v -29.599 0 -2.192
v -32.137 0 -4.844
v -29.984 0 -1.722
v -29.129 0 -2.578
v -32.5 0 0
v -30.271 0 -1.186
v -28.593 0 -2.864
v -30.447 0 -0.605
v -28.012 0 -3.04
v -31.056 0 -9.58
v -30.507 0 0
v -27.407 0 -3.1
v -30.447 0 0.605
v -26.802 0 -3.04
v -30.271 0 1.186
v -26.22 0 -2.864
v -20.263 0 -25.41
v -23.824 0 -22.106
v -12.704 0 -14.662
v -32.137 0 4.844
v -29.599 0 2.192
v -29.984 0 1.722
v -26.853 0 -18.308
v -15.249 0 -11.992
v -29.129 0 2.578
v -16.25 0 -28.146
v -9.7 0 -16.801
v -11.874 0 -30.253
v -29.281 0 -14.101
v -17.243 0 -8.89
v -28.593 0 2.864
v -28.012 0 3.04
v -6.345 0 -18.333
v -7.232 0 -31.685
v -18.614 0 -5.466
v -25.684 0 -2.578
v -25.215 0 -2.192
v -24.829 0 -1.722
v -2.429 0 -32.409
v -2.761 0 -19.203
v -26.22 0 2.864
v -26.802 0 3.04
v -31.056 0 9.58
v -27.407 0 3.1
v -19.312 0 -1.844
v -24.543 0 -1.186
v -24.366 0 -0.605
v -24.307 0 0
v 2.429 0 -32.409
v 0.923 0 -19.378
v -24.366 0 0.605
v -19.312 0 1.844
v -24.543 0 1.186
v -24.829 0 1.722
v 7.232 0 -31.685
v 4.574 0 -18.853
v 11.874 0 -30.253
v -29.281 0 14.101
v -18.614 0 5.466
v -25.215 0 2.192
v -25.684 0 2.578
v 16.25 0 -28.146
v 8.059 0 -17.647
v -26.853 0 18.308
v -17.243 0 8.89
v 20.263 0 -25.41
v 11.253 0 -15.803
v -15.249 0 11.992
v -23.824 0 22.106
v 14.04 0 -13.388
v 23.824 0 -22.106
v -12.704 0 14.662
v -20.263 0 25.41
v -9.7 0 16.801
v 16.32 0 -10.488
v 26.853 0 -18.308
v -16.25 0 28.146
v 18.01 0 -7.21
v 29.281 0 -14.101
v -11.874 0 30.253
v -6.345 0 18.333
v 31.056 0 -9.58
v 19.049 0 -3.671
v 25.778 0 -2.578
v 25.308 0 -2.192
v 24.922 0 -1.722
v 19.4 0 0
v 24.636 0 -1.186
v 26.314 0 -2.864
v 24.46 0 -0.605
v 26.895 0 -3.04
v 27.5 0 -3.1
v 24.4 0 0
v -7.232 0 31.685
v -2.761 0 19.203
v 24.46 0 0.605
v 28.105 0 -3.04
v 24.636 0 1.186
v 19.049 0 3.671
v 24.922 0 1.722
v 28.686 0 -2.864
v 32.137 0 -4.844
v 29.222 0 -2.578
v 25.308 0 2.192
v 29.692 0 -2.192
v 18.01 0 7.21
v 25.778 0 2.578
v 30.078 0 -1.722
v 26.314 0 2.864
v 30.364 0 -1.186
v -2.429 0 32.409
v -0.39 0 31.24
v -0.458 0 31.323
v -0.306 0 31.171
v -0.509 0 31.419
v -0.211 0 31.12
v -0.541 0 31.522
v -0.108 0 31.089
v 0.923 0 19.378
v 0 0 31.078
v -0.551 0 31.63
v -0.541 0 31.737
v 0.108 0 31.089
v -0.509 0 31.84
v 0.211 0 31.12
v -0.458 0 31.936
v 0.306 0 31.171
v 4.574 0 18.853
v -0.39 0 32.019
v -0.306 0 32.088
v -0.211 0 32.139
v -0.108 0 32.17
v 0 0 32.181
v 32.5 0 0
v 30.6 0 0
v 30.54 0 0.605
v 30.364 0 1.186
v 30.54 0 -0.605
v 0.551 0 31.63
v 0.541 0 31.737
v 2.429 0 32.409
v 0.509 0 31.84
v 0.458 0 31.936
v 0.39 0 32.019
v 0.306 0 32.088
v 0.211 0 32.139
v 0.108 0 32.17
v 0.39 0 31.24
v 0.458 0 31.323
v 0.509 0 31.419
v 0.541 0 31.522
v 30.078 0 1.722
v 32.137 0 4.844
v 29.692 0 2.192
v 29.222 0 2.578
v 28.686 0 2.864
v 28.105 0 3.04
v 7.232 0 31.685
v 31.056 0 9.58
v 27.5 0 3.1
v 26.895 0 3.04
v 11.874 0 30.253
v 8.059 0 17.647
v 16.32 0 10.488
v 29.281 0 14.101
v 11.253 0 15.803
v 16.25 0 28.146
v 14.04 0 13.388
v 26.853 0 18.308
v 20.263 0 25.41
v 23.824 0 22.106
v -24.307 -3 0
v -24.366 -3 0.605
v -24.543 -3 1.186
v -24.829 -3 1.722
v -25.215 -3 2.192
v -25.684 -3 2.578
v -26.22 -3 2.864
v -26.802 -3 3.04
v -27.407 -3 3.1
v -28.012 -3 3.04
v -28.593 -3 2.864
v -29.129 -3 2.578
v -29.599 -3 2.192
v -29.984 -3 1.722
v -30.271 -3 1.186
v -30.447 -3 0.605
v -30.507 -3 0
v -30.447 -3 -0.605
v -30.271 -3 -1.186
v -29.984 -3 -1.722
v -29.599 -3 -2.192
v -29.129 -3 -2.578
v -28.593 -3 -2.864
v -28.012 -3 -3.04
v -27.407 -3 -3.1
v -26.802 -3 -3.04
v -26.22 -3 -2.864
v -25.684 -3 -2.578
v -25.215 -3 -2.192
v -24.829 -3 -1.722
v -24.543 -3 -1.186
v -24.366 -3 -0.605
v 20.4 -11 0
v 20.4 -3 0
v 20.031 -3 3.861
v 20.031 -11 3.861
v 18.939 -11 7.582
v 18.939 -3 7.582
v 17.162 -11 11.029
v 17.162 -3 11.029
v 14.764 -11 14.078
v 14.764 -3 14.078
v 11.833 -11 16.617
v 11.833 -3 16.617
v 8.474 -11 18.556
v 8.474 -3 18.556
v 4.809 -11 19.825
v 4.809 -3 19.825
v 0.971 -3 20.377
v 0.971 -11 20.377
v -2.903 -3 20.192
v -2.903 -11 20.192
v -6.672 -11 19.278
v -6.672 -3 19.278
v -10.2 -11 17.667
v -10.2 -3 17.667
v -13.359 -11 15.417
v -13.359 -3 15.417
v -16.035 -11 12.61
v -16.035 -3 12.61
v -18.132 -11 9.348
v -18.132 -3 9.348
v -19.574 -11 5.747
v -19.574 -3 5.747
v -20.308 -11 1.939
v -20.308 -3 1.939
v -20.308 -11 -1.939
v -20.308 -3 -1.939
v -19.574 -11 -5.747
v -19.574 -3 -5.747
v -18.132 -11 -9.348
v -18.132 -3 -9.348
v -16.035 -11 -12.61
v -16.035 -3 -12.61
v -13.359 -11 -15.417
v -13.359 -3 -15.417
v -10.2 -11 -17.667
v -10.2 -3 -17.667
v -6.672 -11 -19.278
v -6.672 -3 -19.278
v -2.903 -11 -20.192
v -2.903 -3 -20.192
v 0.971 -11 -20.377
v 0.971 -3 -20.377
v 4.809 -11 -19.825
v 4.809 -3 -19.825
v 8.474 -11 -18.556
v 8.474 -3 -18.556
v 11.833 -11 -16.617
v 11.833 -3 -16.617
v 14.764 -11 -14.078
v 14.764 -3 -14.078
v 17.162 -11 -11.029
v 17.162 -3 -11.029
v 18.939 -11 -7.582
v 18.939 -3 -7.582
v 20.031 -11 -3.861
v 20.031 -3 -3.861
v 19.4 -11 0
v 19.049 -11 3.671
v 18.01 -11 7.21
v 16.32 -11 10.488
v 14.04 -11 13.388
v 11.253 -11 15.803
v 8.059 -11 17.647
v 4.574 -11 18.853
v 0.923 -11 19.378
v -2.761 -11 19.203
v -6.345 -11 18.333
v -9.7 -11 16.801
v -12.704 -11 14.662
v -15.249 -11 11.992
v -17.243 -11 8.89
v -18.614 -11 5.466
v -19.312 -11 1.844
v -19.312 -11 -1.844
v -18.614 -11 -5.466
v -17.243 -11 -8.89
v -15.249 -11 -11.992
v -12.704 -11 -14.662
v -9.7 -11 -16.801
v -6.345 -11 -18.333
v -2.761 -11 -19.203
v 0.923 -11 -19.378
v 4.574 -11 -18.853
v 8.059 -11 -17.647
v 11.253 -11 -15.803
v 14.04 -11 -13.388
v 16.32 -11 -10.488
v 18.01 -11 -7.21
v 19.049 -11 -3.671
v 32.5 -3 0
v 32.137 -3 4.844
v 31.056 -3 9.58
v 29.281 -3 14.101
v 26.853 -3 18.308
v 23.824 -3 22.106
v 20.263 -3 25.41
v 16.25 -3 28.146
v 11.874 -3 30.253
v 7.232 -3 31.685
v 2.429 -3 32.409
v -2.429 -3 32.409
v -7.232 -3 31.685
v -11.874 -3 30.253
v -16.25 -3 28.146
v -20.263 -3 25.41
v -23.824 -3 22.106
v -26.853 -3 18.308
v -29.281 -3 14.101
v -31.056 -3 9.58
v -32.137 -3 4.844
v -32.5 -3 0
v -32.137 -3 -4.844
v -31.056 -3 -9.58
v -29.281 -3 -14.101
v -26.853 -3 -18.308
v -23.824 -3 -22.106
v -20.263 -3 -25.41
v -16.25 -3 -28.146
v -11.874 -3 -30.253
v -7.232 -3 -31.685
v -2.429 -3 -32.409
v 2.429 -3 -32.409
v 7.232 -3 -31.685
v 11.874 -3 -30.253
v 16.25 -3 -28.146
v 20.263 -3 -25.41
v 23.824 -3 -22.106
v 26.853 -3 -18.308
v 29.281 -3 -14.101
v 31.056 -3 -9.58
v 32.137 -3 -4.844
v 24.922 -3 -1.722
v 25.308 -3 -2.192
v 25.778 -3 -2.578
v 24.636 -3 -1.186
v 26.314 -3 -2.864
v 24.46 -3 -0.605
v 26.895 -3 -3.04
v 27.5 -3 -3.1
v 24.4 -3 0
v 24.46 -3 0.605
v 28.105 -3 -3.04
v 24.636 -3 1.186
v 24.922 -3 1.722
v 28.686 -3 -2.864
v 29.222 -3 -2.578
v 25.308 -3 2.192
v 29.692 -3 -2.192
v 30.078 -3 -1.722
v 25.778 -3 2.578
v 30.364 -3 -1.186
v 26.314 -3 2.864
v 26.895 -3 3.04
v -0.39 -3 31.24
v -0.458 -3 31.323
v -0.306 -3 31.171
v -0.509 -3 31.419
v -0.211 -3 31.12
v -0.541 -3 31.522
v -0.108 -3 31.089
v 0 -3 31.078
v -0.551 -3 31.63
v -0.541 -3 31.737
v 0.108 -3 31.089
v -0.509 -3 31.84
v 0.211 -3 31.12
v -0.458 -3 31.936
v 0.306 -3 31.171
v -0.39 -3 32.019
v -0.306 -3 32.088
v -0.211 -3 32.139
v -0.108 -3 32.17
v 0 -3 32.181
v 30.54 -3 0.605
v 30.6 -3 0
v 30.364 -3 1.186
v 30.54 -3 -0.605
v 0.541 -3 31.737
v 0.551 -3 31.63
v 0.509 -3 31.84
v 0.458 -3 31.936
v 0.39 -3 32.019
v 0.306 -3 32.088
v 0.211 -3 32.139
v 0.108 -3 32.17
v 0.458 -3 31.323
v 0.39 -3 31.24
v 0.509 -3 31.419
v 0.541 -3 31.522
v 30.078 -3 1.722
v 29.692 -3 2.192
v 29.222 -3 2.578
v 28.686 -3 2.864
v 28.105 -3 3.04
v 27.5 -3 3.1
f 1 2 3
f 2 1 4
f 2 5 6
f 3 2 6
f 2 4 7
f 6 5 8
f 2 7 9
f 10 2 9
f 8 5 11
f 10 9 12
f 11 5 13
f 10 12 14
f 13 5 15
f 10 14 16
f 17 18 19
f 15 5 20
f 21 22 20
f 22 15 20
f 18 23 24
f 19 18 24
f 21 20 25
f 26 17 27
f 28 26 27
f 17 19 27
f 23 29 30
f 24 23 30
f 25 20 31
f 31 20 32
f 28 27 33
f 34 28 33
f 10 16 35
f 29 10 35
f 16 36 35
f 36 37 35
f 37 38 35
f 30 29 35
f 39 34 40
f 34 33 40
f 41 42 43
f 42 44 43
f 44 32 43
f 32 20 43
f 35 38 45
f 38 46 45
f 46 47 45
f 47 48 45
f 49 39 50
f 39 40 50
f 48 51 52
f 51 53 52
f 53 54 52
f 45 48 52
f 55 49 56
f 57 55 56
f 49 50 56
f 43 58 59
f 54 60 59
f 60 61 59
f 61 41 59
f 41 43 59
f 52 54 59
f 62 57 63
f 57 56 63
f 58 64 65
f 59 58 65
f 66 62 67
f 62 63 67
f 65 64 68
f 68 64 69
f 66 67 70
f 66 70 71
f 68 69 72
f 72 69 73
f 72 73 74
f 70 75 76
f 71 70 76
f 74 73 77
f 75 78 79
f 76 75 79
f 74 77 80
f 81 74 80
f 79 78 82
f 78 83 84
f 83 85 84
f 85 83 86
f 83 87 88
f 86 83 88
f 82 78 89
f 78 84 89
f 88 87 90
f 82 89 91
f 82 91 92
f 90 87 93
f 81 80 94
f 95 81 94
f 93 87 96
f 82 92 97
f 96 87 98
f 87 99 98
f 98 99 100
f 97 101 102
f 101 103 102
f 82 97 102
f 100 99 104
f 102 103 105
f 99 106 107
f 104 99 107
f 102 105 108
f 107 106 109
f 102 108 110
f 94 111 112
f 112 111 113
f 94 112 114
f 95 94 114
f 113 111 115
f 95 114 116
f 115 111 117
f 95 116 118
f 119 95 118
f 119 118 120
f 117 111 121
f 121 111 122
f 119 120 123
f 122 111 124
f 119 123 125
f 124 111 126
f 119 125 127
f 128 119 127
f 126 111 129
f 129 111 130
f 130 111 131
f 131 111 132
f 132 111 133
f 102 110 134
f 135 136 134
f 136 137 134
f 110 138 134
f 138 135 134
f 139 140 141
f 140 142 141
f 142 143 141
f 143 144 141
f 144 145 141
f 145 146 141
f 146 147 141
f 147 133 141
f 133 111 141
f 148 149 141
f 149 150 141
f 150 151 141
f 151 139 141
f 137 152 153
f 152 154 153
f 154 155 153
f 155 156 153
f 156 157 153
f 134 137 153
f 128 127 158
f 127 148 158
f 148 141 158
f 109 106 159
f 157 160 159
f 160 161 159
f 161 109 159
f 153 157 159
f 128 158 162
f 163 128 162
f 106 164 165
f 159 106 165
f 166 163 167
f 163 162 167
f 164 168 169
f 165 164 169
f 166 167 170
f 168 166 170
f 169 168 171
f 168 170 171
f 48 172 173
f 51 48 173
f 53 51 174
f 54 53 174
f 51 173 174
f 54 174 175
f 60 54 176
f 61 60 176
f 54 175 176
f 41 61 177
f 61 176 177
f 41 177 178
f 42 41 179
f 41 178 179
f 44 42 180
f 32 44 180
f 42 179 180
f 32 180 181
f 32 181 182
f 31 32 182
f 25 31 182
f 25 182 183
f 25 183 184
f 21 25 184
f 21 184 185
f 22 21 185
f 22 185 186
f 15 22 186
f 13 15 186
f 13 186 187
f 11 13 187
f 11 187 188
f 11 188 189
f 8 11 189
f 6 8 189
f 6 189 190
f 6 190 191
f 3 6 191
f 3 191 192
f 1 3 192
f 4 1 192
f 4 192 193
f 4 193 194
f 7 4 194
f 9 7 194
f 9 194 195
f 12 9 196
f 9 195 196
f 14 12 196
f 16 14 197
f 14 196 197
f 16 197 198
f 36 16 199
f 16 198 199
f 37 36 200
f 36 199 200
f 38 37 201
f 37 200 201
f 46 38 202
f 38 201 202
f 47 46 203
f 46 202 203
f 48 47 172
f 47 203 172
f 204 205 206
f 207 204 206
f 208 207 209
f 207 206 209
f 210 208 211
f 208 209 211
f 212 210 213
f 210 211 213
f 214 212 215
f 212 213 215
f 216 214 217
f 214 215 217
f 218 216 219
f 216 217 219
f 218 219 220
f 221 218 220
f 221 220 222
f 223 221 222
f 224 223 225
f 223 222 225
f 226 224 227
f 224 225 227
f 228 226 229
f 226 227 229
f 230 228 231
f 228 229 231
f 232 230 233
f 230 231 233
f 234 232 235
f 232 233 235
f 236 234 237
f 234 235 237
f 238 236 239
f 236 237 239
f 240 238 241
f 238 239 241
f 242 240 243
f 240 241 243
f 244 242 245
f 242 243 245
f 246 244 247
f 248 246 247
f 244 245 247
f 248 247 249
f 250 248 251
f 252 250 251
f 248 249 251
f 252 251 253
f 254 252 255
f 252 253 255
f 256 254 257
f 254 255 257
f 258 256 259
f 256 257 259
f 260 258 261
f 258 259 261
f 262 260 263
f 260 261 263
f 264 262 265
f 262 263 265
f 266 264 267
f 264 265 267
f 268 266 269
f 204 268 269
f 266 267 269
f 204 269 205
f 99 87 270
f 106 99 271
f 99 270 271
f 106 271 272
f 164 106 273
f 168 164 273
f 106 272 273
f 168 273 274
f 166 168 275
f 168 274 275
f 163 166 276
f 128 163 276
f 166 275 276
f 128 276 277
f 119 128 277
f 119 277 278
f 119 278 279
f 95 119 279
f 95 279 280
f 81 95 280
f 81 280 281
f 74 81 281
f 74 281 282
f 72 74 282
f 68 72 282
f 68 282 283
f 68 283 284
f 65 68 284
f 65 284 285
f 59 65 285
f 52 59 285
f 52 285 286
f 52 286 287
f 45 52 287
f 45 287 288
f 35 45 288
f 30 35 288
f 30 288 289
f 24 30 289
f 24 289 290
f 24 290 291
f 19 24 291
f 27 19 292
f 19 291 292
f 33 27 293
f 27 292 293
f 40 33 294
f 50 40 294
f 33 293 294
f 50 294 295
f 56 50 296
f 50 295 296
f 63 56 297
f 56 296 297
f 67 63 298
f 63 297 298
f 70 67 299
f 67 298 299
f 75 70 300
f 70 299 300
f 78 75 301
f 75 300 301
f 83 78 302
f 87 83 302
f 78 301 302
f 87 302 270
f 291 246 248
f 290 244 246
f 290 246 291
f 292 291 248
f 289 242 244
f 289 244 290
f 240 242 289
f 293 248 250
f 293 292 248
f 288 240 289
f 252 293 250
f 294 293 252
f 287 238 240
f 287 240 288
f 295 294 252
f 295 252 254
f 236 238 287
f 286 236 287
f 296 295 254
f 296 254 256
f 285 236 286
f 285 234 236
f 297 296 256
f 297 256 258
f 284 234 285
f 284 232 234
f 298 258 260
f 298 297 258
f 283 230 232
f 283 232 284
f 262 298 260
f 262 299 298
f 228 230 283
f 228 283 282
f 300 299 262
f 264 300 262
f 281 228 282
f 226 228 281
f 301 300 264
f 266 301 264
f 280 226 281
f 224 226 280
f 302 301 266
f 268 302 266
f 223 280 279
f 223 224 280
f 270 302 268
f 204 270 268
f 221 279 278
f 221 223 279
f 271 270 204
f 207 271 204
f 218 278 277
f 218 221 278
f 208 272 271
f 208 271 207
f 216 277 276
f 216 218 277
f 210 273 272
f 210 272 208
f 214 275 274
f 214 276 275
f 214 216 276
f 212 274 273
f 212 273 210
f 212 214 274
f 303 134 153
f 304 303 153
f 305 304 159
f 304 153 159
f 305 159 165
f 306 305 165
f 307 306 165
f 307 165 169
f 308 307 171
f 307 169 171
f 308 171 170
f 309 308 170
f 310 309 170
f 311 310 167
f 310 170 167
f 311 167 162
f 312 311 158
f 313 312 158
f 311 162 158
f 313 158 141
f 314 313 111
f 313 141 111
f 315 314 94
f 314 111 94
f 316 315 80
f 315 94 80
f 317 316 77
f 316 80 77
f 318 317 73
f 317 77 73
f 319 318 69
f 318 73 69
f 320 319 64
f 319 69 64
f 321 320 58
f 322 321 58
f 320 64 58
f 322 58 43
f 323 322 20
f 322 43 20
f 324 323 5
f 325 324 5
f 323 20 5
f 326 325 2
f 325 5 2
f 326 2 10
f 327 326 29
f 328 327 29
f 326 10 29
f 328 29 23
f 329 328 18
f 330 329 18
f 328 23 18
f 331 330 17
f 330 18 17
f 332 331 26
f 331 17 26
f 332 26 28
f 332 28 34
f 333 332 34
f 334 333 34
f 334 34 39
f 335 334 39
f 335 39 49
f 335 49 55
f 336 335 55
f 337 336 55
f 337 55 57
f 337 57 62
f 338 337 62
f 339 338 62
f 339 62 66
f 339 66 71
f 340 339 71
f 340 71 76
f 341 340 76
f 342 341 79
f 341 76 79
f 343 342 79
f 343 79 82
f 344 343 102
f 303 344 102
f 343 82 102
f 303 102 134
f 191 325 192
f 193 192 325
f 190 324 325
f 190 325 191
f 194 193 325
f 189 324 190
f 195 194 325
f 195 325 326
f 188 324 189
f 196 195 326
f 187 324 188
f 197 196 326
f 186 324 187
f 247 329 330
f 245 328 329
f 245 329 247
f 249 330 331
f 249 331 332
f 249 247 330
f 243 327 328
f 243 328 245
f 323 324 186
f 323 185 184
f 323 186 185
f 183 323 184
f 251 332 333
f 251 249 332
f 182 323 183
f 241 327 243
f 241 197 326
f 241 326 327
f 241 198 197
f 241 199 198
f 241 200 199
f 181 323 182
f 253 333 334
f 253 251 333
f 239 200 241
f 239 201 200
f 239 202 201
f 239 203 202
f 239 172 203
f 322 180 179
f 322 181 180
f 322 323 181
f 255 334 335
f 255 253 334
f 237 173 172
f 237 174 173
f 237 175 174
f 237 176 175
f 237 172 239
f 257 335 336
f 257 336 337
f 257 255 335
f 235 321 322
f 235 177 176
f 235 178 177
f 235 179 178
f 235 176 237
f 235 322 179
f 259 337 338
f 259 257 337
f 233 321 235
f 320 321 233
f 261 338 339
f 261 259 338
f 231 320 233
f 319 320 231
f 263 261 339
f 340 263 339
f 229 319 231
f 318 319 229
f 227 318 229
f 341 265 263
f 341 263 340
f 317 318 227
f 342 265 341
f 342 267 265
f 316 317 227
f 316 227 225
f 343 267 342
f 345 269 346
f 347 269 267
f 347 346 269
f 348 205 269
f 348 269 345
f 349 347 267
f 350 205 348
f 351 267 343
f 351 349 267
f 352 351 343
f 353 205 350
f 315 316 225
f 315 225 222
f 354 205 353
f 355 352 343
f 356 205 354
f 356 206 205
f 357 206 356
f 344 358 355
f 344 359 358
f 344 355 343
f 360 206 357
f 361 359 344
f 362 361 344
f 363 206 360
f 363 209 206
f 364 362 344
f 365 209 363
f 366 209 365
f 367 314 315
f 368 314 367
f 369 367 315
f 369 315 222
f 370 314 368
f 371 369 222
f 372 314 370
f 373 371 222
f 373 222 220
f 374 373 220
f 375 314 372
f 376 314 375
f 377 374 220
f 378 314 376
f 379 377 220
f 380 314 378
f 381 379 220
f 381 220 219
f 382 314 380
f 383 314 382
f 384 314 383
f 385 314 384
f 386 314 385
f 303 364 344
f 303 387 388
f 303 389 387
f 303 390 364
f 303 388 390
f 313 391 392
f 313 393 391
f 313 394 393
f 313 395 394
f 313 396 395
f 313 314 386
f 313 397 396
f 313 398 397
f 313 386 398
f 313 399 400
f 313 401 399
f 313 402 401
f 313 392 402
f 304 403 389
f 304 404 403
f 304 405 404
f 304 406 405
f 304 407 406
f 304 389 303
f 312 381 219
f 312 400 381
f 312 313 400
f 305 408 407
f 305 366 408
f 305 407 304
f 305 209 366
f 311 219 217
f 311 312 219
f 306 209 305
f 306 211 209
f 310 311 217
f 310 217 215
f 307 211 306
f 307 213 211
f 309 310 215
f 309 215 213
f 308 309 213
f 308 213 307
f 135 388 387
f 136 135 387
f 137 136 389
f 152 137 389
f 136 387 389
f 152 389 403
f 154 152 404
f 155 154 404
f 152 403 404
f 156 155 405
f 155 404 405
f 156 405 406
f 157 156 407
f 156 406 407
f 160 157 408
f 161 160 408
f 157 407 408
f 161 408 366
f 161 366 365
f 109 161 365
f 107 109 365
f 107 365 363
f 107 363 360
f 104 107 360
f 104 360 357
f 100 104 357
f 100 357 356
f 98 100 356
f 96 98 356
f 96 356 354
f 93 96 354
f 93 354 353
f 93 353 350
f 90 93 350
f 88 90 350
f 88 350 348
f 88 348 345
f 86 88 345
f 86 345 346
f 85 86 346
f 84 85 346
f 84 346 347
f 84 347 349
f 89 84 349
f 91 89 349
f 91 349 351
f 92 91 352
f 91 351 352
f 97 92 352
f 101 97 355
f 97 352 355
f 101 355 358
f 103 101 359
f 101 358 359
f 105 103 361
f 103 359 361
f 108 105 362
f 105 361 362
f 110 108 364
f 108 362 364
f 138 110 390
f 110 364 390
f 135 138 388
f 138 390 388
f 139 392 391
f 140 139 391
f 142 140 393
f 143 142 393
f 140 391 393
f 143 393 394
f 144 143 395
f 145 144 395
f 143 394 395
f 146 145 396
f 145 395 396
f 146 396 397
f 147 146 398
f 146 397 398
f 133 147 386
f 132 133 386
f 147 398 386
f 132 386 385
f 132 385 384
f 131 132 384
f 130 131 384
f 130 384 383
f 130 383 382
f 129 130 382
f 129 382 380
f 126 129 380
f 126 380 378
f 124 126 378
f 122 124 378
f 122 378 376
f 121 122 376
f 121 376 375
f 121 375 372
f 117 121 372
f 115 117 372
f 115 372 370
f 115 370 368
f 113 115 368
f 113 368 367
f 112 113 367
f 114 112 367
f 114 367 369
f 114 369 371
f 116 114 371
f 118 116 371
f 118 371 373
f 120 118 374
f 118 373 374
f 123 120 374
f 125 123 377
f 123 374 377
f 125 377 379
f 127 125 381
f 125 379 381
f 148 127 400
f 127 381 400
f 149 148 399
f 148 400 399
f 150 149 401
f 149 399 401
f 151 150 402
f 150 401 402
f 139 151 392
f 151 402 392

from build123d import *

# Parameters (mm, degrees)
F0_R     = 32.5
F1_DEPTH = 3
F2_R     = 20.4
F3_DEPTH = 8
F4_R     = 19.4
F5_DEPTH = 11.001
F6_R     = 3.1
F6_R_2   = 0.551099
F7_DEPTH = 3.001


with BuildPart() as f1:
    # F0 (on Front) → F1 (new body)
    with BuildSketch(Plane.XZ):
        Circle(F0_R)
    extrude(amount=F1_DEPTH)

    # F2 (on face) → F3 (join)
    with BuildSketch(Plane.XZ.offset(3)):
        Circle(F2_R)
    extrude(amount=F3_DEPTH)

    # F4 (on face) → F5 (cut, through all)
    with BuildSketch(Plane.XZ.offset(11)):
        Circle(F4_R)
    extrude(amount=-F5_DEPTH, mode=Mode.SUBTRACT)

    # F6 (on face) → F7 (cut, through all)
    with BuildSketch(Plane.XZ.offset(3)):
        with Locations((27.5, 0)):
            Circle(F6_R)
        with Locations((-27.406738, 0)):
            Circle(F6_R)
        with Locations((0, 31.629574)):
            Circle(F6_R_2)
    extrude(amount=-F7_DEPTH, mode=Mode.SUBTRACT)


solid = f1.part
